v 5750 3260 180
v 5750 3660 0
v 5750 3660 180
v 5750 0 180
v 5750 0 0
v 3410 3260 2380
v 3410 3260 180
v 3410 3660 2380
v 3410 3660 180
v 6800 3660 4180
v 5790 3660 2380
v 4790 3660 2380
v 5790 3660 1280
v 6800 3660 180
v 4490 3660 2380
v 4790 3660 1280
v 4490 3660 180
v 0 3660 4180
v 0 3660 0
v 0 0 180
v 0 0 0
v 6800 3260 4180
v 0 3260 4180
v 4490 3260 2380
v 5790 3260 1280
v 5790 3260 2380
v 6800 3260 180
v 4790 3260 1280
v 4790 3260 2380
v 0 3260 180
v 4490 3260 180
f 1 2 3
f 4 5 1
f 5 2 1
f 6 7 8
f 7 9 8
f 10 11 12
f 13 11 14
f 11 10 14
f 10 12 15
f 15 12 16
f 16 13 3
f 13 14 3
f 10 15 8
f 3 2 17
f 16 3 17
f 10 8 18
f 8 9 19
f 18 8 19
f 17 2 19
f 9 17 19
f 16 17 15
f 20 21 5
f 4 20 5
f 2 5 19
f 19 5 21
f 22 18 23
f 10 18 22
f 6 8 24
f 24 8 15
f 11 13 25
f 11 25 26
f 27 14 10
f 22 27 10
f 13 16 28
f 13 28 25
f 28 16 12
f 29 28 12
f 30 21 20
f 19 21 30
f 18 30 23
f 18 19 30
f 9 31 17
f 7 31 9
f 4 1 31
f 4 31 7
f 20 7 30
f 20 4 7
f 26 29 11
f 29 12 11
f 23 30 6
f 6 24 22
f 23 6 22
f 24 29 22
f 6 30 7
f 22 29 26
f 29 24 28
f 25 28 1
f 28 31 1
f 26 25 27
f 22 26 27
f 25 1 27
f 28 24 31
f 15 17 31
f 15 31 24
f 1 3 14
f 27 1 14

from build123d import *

# Parameters (mm, degrees)
F0_W     = 5750
F0_H     = 3500
F1_DEPTH = 180
F2_W     = 5750
F2_H     = 180
F3_DEPTH = 160
F4_W     = 5750
F4_H     = 200
F4_W_2   = 1050
F5_DEPTH = 4000
F6_W     = 1080
F6_H     = 2200
F6_W_2   = 1000
F6_H_2   = 1100
F7_DEPTH = 200.001
F8_DEPTH = 200


with BuildPart() as f1:
    # F0 (on Top) → F1 (new body)
    with BuildSketch(Plane.XY):
        with Locations((2875, 1750)):
            Rectangle(F0_W, F0_H)
    extrude(amount=F1_DEPTH)

    # F2 (on face) → F3 (join)
    with BuildSketch(Plane(origin=(0, 3500, 0), x_dir=(-1, 0, 0), z_dir=(0, 1, 0))):
        with Locations((-2875, 90)):
            Rectangle(F2_W, F2_H)
    extrude(amount=F3_DEPTH)

    # F4 (on face) → F5 (join)
    with BuildSketch(Plane.XY.offset(180)):
        with Locations((2875, 3560)):
            Rectangle(F4_W, F4_H)
        with Locations((6275, 3560)):
            Rectangle(F4_W_2, F4_H)
    extrude(amount=F5_DEPTH)

    # F6 (on face) → F7 (cut, through all)
    with BuildSketch(Plane.XZ.offset(-3460)):
        with Locations((3950, 1280)):
            Rectangle(F6_W, F6_H)
        with Locations((5290, 1830)):
            Rectangle(F6_W_2, F6_H_2)
    extrude(amount=-F7_DEPTH, mode=Mode.SUBTRACT)

    # F8 (add): a face of the model
    f8_faces = [f1.faces().sort_by_distance(p)[0] for p in [
        (3257.2837632777, 3460, 2286.3648625864),
    ]]
    extrude(f8_faces, amount=F8_DEPTH)


solid = f1.part
